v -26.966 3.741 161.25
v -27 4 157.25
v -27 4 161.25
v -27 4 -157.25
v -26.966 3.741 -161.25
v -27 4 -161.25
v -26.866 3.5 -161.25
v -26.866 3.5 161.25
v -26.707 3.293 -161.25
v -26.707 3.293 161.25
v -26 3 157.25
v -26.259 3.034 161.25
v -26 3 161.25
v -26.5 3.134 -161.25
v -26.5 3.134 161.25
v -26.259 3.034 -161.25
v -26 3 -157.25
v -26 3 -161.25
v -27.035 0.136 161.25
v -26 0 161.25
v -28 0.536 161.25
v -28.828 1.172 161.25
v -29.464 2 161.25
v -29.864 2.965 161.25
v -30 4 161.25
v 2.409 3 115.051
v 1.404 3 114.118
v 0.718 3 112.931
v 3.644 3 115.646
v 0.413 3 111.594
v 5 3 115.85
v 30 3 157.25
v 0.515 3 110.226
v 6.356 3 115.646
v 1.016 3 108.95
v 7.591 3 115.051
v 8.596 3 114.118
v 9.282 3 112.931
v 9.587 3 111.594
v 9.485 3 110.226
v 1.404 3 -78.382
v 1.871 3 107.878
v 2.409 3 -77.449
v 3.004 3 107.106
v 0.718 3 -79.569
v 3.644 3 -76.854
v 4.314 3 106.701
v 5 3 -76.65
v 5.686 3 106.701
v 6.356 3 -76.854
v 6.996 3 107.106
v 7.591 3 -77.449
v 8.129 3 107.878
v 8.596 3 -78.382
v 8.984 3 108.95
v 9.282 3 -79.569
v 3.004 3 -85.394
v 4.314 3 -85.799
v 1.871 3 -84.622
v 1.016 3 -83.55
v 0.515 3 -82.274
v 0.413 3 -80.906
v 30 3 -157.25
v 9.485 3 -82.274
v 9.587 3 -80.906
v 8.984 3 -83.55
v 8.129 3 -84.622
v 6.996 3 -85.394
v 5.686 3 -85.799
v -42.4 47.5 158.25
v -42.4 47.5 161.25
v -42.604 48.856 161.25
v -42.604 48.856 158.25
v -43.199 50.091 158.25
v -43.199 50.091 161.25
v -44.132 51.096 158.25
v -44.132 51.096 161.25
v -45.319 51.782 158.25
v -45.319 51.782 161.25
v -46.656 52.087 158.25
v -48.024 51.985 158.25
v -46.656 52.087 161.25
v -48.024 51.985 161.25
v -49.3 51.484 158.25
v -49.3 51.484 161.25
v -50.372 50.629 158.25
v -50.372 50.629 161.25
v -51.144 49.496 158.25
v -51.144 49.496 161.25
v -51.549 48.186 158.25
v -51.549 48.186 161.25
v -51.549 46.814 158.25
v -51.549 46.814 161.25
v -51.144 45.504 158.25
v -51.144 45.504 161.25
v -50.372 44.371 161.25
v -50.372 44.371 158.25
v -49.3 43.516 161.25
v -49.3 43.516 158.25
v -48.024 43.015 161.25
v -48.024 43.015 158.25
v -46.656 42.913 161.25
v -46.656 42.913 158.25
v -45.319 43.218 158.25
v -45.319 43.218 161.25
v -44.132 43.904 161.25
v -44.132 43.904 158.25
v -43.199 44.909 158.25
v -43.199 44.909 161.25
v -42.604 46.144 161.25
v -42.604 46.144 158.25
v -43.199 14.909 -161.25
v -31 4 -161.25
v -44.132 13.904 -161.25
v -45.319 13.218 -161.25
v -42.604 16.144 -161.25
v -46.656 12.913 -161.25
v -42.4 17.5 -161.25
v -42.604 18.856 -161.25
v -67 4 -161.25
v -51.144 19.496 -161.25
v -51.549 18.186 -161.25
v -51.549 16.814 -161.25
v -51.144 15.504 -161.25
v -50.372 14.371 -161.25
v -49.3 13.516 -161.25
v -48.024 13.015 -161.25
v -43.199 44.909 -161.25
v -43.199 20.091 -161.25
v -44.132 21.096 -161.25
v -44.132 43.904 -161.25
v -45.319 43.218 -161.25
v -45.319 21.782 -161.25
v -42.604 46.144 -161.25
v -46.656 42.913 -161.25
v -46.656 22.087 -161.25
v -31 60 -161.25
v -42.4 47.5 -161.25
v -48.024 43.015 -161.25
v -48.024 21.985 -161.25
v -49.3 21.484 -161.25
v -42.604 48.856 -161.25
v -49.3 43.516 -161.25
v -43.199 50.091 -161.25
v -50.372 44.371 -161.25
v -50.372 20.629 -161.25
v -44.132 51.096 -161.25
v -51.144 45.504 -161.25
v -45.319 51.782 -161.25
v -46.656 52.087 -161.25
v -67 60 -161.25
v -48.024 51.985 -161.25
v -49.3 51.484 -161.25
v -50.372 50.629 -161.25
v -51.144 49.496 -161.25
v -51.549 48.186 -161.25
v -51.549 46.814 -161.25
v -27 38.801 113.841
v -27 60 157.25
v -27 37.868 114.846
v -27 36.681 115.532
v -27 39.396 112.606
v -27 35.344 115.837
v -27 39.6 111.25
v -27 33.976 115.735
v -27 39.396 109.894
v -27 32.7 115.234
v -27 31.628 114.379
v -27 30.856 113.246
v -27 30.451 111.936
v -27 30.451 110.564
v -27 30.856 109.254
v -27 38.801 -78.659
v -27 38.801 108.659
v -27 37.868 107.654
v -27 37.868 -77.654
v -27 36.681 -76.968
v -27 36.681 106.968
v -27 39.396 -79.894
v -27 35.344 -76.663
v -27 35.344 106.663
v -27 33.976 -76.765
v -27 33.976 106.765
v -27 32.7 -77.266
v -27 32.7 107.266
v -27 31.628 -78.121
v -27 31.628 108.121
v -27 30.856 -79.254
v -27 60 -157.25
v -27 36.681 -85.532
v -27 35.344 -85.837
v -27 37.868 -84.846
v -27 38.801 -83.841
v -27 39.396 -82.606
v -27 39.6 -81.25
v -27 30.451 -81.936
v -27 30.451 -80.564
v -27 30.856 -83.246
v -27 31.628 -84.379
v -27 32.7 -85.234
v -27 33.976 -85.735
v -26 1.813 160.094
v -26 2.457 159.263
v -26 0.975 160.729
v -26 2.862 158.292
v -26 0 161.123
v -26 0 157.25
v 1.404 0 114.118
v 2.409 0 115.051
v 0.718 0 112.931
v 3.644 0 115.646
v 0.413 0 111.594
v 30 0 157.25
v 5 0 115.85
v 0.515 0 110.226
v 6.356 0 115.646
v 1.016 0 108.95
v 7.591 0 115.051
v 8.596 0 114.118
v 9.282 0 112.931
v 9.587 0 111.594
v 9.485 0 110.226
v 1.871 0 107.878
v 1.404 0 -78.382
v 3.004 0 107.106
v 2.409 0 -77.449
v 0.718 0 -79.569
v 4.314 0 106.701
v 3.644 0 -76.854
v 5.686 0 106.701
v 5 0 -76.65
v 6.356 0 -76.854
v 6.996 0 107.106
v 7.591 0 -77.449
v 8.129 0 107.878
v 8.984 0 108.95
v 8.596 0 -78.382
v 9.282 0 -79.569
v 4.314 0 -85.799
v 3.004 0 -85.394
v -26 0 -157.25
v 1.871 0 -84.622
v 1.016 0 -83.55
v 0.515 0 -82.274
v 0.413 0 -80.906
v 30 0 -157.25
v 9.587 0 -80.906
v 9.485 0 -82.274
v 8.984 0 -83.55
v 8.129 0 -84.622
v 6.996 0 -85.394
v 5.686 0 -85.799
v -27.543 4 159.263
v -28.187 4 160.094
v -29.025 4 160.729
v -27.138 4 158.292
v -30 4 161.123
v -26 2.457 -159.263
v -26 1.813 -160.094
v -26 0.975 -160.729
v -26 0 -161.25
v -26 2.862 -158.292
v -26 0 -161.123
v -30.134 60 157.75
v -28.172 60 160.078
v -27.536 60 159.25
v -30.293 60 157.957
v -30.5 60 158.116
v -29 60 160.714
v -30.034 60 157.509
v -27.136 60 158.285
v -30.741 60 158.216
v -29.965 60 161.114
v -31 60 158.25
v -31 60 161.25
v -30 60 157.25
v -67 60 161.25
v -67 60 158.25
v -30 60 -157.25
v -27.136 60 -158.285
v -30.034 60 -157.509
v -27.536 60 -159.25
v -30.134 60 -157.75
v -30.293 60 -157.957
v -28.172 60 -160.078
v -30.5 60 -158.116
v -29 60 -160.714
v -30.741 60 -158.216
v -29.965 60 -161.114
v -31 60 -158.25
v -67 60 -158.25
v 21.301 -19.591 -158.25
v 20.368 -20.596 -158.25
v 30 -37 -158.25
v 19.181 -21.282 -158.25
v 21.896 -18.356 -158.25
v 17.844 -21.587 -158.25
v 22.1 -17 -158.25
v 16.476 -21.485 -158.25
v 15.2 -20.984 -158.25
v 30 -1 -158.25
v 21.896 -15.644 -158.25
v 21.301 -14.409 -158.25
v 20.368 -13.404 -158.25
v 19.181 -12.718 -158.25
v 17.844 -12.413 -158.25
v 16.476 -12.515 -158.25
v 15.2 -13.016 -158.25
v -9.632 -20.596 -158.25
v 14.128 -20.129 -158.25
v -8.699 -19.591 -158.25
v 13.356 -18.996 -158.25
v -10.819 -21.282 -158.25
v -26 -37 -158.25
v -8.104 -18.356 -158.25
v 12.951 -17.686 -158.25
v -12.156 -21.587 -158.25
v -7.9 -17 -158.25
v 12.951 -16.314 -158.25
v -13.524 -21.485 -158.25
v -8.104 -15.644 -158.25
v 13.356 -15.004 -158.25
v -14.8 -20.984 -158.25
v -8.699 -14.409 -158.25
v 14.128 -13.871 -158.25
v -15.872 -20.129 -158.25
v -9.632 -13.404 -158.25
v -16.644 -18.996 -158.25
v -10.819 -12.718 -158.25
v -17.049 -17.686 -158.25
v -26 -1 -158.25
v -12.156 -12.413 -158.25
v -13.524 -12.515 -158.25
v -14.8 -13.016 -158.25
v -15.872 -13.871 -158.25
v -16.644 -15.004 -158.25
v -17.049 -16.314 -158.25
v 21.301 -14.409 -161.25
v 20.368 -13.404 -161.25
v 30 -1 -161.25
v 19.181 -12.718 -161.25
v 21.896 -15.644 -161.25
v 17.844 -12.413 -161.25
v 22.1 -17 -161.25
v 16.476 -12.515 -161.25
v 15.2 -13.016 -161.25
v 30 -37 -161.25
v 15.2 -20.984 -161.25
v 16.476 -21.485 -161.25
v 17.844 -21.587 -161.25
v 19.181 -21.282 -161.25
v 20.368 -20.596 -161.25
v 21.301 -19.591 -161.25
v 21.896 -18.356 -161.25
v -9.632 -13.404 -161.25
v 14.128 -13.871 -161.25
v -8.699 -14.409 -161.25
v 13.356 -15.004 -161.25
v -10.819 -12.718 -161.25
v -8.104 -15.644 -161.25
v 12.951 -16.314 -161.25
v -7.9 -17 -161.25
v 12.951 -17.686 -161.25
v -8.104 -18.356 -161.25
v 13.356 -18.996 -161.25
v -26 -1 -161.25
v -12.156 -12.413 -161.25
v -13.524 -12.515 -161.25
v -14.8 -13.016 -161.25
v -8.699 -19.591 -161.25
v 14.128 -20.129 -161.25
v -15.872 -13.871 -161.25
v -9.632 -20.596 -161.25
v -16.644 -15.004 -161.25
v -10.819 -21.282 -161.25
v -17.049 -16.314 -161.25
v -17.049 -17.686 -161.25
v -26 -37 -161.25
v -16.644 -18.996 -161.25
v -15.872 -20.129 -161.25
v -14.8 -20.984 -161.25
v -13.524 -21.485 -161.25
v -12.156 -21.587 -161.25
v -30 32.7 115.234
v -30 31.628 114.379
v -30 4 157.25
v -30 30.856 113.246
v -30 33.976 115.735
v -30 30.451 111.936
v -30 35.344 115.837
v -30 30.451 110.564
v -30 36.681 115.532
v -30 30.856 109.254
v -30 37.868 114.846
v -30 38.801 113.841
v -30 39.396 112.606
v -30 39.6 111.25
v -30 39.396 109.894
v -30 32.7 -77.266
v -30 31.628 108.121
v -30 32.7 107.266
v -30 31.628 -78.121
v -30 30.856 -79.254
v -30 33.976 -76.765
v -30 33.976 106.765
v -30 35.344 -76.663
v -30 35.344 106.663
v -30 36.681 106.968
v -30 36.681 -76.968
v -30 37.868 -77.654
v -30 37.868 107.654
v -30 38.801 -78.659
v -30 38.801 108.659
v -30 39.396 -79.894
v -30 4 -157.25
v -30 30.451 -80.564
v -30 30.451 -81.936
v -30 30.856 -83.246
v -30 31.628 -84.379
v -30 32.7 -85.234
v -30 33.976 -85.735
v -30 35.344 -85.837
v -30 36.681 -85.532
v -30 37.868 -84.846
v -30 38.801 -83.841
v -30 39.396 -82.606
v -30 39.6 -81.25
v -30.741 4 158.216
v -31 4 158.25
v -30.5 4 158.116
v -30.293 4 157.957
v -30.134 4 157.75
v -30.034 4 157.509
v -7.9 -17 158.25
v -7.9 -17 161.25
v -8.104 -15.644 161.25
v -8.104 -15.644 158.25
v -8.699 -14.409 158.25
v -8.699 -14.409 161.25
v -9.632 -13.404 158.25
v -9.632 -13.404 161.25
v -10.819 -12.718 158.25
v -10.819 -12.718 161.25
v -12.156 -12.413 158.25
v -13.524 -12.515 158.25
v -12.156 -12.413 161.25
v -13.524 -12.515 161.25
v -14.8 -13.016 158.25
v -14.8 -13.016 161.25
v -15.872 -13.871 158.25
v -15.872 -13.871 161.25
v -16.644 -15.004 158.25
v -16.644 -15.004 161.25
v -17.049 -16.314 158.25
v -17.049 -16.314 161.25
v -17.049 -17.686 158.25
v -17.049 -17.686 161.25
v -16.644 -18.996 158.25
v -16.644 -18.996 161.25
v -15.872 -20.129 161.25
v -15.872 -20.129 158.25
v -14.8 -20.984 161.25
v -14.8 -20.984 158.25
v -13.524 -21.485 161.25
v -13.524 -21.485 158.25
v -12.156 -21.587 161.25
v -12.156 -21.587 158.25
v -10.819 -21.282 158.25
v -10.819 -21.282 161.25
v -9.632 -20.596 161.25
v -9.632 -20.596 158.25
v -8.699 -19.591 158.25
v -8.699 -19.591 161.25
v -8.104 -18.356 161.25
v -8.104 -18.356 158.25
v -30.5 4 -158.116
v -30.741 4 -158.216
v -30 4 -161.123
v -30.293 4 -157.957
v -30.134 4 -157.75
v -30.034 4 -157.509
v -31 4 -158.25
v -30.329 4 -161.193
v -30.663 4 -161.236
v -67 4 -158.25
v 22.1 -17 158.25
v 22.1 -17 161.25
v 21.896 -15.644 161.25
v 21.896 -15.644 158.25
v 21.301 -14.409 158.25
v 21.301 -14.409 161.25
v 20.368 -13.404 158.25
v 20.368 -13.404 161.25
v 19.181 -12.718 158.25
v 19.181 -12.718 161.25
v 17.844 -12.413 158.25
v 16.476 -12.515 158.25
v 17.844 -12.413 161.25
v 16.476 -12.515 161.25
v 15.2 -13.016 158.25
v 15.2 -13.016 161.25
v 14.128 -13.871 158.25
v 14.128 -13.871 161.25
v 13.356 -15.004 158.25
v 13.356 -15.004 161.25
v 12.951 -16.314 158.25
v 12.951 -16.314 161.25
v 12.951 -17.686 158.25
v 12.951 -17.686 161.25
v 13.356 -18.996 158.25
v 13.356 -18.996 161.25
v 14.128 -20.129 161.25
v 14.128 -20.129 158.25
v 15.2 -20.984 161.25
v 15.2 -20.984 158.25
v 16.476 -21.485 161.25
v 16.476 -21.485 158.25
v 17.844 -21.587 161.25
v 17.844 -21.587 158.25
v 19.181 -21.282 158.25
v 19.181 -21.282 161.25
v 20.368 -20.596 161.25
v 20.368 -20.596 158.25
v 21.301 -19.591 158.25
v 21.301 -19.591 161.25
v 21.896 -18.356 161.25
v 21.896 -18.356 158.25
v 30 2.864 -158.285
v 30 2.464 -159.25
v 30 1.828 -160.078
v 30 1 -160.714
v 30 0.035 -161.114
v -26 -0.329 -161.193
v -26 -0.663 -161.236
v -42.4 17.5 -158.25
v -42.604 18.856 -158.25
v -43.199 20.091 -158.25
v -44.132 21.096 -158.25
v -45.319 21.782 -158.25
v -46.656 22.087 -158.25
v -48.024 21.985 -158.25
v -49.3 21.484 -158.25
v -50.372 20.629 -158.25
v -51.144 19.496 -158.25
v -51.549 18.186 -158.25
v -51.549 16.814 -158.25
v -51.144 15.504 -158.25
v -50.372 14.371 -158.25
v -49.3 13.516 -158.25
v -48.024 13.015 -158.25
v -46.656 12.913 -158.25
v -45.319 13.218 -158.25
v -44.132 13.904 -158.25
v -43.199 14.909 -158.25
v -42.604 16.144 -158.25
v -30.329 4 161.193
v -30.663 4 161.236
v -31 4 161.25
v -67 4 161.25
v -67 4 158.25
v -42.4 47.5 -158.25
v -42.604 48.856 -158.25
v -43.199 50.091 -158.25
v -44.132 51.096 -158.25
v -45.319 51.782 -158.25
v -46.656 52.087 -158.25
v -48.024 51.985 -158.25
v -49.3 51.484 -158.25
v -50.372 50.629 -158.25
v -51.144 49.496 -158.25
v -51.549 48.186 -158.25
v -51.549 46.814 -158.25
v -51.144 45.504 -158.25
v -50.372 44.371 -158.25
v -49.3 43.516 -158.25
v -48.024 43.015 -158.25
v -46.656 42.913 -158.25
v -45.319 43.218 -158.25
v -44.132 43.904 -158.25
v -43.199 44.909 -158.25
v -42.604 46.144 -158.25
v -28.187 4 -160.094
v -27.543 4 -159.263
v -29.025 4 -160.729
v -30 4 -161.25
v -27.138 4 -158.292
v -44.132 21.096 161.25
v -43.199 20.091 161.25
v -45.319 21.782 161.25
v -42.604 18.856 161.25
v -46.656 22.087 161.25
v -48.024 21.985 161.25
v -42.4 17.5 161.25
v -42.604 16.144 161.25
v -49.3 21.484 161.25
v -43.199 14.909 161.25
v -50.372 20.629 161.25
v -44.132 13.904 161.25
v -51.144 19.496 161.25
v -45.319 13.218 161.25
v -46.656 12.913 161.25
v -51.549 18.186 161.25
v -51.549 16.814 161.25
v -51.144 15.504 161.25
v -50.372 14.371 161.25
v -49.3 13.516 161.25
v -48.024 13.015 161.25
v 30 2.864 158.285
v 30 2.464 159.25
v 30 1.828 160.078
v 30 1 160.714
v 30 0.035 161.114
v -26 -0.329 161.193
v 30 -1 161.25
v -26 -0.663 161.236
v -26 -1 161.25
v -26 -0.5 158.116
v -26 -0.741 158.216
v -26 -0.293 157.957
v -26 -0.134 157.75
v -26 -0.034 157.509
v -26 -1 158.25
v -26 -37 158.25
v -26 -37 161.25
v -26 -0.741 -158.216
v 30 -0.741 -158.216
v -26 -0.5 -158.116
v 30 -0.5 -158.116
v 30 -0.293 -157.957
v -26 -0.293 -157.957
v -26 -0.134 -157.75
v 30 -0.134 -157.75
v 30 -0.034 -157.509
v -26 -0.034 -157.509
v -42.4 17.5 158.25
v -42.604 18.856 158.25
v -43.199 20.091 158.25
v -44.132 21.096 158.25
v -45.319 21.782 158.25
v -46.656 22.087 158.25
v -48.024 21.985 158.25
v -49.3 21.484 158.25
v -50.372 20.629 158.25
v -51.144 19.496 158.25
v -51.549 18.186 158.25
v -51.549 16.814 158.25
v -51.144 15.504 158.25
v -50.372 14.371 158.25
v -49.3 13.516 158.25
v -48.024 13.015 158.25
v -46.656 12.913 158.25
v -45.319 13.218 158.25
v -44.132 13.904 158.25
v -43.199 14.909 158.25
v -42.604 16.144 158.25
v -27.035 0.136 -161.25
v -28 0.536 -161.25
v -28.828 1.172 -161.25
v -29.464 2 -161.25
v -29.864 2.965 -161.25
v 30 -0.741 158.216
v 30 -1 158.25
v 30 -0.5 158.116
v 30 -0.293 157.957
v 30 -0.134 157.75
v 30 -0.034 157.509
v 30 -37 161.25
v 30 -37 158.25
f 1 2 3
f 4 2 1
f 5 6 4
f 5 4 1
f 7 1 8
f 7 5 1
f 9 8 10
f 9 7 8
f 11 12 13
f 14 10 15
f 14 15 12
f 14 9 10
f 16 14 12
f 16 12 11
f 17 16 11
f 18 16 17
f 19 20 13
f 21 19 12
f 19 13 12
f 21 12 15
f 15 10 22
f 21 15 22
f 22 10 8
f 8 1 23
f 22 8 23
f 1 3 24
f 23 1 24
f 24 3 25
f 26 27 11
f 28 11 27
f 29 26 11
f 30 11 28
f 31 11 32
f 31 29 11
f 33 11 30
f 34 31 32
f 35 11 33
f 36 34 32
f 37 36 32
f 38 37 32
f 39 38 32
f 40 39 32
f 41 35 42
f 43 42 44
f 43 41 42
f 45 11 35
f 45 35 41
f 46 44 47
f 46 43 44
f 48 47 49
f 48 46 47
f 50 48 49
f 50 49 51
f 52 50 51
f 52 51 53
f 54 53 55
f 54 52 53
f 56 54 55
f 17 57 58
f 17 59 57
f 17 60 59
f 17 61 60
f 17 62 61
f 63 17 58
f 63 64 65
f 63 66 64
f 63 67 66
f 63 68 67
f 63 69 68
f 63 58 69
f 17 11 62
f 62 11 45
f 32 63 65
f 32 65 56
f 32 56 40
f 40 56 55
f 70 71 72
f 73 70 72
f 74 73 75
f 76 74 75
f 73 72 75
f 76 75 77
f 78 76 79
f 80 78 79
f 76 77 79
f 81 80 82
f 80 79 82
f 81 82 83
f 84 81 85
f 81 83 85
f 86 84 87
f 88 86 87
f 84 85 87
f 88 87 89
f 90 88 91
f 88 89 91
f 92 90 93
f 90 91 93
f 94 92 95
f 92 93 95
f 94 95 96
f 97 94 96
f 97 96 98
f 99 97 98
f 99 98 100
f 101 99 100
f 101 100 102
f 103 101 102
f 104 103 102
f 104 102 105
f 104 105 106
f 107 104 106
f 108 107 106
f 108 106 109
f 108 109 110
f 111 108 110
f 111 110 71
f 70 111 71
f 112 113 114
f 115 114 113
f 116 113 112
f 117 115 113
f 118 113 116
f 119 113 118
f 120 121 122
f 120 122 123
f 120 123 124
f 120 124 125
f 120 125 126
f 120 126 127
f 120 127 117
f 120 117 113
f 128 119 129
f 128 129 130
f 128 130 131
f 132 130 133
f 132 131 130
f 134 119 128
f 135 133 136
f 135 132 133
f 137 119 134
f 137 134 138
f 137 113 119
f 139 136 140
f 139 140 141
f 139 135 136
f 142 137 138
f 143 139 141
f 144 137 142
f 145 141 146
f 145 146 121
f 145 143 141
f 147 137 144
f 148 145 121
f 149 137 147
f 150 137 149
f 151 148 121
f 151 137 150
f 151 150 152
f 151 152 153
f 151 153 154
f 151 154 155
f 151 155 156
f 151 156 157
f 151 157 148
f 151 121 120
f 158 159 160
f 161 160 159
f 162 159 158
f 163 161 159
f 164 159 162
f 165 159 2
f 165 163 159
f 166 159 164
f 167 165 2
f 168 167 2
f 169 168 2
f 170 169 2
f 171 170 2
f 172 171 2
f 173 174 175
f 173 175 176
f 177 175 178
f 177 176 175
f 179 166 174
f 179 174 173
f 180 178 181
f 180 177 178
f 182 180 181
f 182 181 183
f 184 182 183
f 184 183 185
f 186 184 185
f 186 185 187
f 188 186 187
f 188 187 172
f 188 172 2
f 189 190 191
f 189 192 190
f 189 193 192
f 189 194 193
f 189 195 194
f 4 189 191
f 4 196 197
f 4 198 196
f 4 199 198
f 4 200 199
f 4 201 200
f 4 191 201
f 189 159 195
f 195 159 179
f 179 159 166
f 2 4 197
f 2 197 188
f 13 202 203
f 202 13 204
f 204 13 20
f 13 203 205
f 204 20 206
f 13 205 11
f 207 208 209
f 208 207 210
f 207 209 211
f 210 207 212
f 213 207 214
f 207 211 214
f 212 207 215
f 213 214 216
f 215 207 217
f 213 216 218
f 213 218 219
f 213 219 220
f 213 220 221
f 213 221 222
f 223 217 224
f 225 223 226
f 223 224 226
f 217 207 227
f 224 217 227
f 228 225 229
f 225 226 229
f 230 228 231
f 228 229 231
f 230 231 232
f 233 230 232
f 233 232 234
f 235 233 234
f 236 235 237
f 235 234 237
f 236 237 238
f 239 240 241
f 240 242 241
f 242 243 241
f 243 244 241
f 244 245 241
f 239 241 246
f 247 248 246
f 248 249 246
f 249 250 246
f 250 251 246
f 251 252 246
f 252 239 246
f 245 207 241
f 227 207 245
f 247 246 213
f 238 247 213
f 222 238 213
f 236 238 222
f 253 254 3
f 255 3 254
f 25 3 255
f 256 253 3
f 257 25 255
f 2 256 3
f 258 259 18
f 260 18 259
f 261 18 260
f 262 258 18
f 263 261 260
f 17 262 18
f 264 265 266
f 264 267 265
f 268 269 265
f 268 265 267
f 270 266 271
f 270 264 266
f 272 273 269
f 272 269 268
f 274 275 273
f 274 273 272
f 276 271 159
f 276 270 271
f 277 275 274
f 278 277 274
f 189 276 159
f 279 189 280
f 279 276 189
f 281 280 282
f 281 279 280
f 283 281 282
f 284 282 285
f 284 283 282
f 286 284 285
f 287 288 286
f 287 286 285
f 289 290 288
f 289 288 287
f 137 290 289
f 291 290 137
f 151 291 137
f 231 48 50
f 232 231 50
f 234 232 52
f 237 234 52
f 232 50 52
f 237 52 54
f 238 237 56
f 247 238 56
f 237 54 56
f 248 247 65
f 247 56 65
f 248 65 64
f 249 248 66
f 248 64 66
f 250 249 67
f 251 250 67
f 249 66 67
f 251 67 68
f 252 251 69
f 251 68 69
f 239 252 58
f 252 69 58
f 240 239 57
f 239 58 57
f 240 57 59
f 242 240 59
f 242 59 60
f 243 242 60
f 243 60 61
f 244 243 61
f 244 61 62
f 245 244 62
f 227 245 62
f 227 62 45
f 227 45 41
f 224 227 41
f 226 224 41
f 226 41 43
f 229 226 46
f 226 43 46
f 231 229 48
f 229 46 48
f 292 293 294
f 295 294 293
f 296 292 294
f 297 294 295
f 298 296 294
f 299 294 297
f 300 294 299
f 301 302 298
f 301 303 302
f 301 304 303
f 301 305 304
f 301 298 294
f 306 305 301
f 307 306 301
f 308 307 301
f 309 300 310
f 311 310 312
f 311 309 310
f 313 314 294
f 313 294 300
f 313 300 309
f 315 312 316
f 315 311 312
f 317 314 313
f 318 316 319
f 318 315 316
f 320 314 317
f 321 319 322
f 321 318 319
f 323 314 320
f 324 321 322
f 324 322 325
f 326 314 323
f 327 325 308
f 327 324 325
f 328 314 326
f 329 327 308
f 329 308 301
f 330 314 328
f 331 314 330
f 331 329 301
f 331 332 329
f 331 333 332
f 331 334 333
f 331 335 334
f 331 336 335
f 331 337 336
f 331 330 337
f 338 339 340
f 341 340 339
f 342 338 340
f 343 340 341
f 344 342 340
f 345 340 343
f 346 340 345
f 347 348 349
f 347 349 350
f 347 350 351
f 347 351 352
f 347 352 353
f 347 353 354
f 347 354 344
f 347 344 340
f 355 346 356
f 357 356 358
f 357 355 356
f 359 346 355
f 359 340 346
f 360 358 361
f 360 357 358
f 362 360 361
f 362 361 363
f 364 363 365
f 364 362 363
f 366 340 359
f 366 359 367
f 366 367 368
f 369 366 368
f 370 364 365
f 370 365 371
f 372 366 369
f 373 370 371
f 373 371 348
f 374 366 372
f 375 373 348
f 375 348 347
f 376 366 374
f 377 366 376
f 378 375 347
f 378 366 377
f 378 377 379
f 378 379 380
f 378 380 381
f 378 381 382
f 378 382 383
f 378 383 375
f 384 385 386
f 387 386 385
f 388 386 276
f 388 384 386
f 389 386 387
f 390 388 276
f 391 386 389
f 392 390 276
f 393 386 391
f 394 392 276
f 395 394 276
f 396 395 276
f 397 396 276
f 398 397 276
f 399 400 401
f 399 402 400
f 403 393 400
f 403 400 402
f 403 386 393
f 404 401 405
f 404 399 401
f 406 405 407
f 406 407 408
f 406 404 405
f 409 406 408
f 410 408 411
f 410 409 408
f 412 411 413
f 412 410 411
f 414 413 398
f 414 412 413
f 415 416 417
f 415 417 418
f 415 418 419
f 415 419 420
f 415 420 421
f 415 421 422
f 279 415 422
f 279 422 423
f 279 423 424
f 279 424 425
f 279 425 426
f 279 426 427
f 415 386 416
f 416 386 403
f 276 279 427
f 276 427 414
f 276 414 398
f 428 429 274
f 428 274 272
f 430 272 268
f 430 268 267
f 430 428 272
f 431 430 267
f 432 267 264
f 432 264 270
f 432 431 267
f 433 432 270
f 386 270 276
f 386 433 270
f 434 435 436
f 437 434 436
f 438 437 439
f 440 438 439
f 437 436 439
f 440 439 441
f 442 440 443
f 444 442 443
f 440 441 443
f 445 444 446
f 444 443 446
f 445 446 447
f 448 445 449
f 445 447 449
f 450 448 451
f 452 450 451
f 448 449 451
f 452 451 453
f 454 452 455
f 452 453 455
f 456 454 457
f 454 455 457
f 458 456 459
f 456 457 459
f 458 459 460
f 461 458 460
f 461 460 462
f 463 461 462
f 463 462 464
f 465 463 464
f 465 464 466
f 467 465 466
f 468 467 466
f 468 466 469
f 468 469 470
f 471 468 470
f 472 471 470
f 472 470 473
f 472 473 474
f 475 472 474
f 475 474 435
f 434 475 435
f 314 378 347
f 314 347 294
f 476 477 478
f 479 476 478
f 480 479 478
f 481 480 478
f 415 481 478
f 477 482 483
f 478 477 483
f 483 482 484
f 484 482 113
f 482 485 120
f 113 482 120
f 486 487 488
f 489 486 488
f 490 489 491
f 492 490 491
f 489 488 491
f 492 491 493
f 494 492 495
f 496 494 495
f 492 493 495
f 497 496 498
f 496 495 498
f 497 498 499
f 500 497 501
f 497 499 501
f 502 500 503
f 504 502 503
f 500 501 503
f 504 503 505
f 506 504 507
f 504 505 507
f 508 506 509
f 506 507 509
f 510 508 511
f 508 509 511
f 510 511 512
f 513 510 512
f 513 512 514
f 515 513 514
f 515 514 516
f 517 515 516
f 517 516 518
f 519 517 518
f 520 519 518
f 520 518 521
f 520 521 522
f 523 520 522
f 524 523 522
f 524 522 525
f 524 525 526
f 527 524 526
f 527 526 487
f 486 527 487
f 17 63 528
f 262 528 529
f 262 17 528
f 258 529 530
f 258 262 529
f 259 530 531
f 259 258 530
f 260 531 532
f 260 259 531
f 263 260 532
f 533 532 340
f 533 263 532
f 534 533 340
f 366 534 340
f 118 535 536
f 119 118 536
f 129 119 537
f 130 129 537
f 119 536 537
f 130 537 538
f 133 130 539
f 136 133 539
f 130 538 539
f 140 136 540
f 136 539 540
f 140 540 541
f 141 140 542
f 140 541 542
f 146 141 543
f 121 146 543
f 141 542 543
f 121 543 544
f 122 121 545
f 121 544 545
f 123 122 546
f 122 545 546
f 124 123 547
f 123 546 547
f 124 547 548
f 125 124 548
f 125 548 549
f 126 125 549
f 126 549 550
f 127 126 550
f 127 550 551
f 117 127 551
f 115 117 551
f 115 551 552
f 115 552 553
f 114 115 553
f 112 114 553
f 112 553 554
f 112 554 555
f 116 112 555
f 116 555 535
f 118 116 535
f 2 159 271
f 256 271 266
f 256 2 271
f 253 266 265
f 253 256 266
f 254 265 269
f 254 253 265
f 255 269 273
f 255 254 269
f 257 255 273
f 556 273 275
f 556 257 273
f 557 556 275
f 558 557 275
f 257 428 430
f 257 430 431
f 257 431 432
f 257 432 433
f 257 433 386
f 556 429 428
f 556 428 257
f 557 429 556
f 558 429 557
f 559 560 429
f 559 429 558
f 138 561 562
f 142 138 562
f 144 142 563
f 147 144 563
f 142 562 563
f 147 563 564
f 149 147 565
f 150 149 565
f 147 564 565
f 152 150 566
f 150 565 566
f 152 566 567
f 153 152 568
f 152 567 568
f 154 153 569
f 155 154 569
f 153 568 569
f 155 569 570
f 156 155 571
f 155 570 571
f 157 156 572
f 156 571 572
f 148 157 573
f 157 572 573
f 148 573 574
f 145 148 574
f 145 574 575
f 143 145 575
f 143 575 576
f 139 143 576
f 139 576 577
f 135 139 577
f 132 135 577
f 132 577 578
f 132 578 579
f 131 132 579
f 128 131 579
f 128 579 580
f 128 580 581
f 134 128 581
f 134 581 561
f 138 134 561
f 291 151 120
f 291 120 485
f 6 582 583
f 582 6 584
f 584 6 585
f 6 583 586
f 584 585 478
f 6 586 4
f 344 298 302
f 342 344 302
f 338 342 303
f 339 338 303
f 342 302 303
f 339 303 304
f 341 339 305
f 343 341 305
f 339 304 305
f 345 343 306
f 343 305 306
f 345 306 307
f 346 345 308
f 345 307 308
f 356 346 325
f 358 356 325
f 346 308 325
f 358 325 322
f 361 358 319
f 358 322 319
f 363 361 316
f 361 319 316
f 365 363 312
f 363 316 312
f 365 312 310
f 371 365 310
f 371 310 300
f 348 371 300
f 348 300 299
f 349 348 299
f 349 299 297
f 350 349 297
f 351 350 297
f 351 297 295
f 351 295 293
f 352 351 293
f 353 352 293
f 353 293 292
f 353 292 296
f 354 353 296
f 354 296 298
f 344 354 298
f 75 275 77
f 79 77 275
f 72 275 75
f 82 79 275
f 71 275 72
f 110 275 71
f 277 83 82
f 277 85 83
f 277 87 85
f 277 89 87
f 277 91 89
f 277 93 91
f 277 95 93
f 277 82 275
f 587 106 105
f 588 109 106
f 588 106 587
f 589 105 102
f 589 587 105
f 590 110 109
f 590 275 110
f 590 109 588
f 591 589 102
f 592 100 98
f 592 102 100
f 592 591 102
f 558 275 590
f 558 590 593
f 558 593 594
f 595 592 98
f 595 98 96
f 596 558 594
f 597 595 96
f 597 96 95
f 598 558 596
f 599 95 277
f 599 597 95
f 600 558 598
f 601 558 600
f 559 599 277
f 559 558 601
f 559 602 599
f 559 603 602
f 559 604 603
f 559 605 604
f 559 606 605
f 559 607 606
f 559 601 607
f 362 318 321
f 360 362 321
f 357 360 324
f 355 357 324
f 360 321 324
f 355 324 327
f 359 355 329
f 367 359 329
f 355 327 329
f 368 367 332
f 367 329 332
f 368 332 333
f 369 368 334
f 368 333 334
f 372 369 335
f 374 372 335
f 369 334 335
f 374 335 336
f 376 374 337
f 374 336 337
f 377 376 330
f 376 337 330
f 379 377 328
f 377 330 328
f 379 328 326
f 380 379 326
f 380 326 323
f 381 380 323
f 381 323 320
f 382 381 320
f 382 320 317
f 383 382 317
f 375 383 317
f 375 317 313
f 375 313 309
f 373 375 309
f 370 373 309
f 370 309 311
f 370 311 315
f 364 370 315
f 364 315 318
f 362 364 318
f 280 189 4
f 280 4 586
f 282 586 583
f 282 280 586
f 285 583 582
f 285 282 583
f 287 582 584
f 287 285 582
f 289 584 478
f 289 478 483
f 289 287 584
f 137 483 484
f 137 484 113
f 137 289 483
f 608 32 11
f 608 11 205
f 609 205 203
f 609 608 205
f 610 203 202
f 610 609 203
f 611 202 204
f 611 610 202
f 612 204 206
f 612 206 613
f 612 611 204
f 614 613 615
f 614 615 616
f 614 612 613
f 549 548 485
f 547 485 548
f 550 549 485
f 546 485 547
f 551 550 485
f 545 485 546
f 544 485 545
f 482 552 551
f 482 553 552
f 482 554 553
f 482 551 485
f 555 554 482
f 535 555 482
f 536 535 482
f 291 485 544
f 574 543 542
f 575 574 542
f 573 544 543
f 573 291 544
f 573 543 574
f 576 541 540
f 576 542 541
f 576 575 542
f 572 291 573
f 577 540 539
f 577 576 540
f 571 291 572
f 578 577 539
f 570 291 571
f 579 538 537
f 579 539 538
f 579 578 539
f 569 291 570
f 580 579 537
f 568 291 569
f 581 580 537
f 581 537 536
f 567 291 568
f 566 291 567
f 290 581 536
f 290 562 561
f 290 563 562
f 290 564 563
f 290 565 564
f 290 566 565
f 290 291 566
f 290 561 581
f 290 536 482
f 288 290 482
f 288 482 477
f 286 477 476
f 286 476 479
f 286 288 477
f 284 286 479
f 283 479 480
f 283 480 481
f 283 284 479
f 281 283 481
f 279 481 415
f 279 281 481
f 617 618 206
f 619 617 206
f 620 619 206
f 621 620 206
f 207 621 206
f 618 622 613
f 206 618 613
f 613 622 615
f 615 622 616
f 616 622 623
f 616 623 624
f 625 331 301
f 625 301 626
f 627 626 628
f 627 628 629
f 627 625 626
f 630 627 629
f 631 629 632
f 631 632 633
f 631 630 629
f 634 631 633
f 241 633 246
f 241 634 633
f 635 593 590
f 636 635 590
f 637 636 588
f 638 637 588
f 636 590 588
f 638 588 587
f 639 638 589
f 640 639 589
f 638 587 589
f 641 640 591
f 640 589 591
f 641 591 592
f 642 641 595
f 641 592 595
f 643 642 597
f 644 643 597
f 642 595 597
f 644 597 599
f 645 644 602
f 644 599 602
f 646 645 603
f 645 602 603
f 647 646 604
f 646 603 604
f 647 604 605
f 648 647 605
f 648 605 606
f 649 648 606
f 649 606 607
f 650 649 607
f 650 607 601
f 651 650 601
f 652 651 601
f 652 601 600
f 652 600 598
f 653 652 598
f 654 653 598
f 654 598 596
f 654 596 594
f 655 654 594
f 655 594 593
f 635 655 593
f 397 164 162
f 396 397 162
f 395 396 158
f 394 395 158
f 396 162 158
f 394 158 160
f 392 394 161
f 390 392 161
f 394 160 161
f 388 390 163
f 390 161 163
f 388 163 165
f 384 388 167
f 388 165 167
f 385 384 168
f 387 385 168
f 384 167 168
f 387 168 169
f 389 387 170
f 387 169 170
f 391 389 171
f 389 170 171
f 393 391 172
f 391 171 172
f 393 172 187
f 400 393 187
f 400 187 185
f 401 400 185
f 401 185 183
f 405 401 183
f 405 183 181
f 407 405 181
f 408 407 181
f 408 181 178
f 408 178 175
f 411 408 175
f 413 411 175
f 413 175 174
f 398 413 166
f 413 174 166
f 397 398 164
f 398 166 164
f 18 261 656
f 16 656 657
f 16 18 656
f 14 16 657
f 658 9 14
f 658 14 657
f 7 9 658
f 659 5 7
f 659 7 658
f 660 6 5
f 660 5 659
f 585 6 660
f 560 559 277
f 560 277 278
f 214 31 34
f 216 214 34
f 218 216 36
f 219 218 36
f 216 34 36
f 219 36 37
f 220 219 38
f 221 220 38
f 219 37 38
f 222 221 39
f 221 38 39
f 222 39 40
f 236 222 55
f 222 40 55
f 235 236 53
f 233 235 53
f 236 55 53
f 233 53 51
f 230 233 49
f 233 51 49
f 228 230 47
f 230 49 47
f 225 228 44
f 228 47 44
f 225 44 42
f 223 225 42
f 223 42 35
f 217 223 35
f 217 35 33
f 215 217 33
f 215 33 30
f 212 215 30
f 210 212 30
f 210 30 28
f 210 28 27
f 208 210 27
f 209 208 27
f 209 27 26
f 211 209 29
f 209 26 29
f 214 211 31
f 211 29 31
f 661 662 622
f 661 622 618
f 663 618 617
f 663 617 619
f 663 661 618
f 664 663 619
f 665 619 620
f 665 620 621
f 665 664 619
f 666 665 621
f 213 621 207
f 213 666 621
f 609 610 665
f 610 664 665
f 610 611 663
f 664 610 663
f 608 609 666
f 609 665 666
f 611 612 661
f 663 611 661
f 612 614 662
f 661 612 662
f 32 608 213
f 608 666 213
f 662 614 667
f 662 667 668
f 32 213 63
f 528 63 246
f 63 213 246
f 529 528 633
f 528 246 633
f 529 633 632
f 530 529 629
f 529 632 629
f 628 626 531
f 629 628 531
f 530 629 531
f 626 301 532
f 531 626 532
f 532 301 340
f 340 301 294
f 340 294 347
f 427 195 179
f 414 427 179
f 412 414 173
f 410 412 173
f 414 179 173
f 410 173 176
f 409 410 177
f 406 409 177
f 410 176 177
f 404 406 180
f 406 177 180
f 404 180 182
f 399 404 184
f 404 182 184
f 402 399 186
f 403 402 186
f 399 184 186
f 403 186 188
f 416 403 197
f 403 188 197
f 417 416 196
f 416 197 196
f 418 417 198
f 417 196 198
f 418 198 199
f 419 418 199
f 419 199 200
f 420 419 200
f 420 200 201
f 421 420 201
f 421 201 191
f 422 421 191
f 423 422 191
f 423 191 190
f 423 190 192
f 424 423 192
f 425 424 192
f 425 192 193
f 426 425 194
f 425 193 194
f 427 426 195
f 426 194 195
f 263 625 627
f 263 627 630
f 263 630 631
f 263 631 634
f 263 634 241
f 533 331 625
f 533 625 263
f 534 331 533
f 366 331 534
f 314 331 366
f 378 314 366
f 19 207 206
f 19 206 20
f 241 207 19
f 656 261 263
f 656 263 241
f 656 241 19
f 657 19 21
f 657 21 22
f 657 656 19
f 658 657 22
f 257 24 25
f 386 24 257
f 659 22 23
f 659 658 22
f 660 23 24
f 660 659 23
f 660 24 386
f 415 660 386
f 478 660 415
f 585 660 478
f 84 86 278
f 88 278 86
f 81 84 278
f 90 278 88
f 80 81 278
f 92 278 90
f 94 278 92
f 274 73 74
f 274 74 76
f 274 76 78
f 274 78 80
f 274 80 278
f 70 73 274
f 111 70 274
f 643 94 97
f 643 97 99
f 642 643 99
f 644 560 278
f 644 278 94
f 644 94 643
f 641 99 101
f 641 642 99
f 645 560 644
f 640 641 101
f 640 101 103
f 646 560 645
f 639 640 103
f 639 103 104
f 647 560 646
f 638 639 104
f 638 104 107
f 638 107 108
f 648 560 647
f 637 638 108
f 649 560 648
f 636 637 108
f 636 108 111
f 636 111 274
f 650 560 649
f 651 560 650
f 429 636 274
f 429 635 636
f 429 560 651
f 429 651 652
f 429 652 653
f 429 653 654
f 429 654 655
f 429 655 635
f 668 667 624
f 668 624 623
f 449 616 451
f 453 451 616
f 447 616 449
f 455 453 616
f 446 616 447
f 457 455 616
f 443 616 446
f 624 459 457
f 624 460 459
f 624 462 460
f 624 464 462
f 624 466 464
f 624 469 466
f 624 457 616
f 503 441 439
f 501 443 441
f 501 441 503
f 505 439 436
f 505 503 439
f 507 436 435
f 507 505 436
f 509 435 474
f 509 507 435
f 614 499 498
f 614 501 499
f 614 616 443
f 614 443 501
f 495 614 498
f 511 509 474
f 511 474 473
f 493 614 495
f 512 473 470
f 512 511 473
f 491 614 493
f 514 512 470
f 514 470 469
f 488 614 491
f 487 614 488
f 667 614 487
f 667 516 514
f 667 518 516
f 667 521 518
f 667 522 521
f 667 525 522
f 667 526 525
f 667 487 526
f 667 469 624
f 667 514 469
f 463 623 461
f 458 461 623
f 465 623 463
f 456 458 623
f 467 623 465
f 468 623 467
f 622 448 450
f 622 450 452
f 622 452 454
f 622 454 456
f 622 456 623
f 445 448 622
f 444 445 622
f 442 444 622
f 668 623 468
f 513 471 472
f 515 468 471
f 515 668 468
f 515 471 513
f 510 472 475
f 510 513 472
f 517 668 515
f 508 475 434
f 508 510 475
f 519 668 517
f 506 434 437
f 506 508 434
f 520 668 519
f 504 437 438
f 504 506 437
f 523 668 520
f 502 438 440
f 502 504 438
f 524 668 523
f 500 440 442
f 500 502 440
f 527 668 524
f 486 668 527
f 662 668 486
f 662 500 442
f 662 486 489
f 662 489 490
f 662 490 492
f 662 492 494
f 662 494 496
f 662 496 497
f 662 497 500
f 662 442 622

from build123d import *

# Parameters (mm, degrees)
SKETCH1_W                      = 60
SKETCH1_H                      = 322.5
BASE_FLANGE1_DEPTH             = 3
EDGE_FLANGE1_STRIP_W           = 14
EDGE_FLANGE1_STRIP_H           = 3
EDGE_FLANGE1_STRIP_CUT_DEPTH   = 322.5
EDGE_FLANGE1_DEPTH             = 322.5
EDGE_FLANGE2_STRIP_W           = 14
EDGE_FLANGE2_STRIP_H           = 3
EDGE_FLANGE2_STRIP_CUT_DEPTH   = 56
EDGE_FLANGE2_STRIP_2_W         = 14
EDGE_FLANGE2_STRIP_2_H         = 3
EDGE_FLANGE2_STRIP_CUT_2_DEPTH = 56
EDGE_FLANGE2_STRIP_3_W         = 14
EDGE_FLANGE2_STRIP_3_H         = 3
EDGE_FLANGE2_STRIP_CUT_3_DEPTH = 56
EDGE_FLANGE2_STRIP_4_W         = 14
EDGE_FLANGE2_STRIP_4_H         = 3
EDGE_FLANGE2_STRIP_CUT_4_DEPTH = 56
EDGE_FLANGE2_DEPTH             = 56
EDGE_FLANGE2_BEND_DEPTH        = 56
EDGE_FLANGE2_BEND_2_DEPTH      = 56
EDGE_FLANGE2_BEND_3_DEPTH      = 56
SKETCH18_R                     = 4.6
EXTRUDE1_DEPTH                 = 335.806287277
SKETCH19_R                     = 4.6
EXTRUDE2_DEPTH                 = 3
SKETCH20_R                     = 4.6
EXTRUDE3_DEPTH                 = 3


# Sheet-metal steps are written as plain solids
with BuildPart() as part:
    # Sketch1 → Base-Flange1 (new body)
    with BuildSketch(Plane(origin=(0, 0, 0), x_dir=(1, 0, 0), z_dir=(0, 1, 0))):
        Rectangle(SKETCH1_W, SKETCH1_H)
    extrude(amount=BASE_FLANGE1_DEPTH)

    # Edge-Flange1 strip (across the edge) → Edge-Flange1 strip cut (cut)
    with BuildSketch(Plane(origin=(-30, 3, -161.25), x_dir=(1, 0, 0), z_dir=(0, 0, 1))):
        with Locations((-3, -1.5)):
            Rectangle(EDGE_FLANGE1_STRIP_W, EDGE_FLANGE1_STRIP_H)
    extrude(amount=EDGE_FLANGE1_STRIP_CUT_DEPTH, mode=Mode.SUBTRACT)

    # Edge-Flange1 section (across the edge) → Edge-Flange1 (add)
    with BuildSketch(Plane(origin=(-30, 3, -161.25), x_dir=(1, 0, 0), z_dir=(0, 0, 1))):
        with BuildLine():
            Line((0, 1), (0, 57))
            Line((0, 57), (3, 57))
            Line((3, 57), (3, 1))
            ThreePointArc((3, 1), (3.292893219, 0.292893219), (4, 0))
            Line((4, 0), (4, -3))
            ThreePointArc((4, -3), (1.171572875, -1.828427125), (0, 1))
        make_face()
    extrude(amount=EDGE_FLANGE1_DEPTH)

    # Edge-Flange2 strip (across the edge) → Edge-Flange2 strip cut (cut)
    with BuildSketch(Plane(origin=(-30, 4, 161.25), x_dir=(0, 0, -1), z_dir=(0, 1, 0))):
        with Locations((-3, -1.5)):
            Rectangle(EDGE_FLANGE2_STRIP_W, EDGE_FLANGE2_STRIP_H)
    extrude(amount=EDGE_FLANGE2_STRIP_CUT_DEPTH, mode=Mode.SUBTRACT)

    # Edge-Flange2 strip 2 (across the edge) → Edge-Flange2 strip cut 2 (cut)
    with BuildSketch(Plane(origin=(30, 0, 161.25), x_dir=(0, 0, -1), z_dir=(-1, 0, 0))):
        with Locations((-3, -1.5)):
            Rectangle(EDGE_FLANGE2_STRIP_2_W, EDGE_FLANGE2_STRIP_2_H)
    extrude(amount=EDGE_FLANGE2_STRIP_CUT_2_DEPTH, mode=Mode.SUBTRACT)

    # Edge-Flange2 strip 3 (across the edge) → Edge-Flange2 strip cut 3 (cut)
    with BuildSketch(Plane(origin=(-30, 60, -161.25), x_dir=(0, 0, 1), z_dir=(0, -1, 0))):
        with Locations((-3, -1.5)):
            Rectangle(EDGE_FLANGE2_STRIP_3_W, EDGE_FLANGE2_STRIP_3_H)
    extrude(amount=EDGE_FLANGE2_STRIP_CUT_3_DEPTH, mode=Mode.SUBTRACT)

    # Edge-Flange2 strip 4 (across the edge) → Edge-Flange2 strip cut 4 (cut)
    with BuildSketch(Plane(origin=(-26, 0, -161.25), x_dir=(0, 0, 1), z_dir=(1, 0, 0))):
        with Locations((-3, -1.5)):
            Rectangle(EDGE_FLANGE2_STRIP_4_W, EDGE_FLANGE2_STRIP_4_H)
    extrude(amount=EDGE_FLANGE2_STRIP_CUT_4_DEPTH, mode=Mode.SUBTRACT)

    # Edge-Flange2 section (across the edge) → Edge-Flange2 (add)
    with BuildSketch(Plane(origin=(-30, 4, 161.25), x_dir=(0, 0, -1), z_dir=(0, 1, 0))):
        with BuildLine():
            Line((0, 1), (0, 37))
            Line((0, 37), (3, 37))
            Line((3, 37), (3, 1))
            ThreePointArc((3, 1), (3.292893219, 0.292893219), (4, 0))
            Line((4, 0), (4, -3))
            ThreePointArc((4, -3), (1.171572875, -1.828427125), (0, 1))
        make_face()
    extrude(amount=EDGE_FLANGE2_DEPTH)

    # Edge-Flange2 section 2 (across the edge) → Edge-Flange2 bend (add)
    with BuildSketch(Plane(origin=(30, 0, 161.25), x_dir=(0, 0, -1), z_dir=(-1, 0, 0))):
        with BuildLine():
            Line((0, 1), (0, 37))
            Line((0, 37), (3, 37))
            Line((3, 37), (3, 1))
            ThreePointArc((3, 1), (3.292893219, 0.292893219), (4, 0))
            Line((4, 0), (4, -3))
            ThreePointArc((4, -3), (1.171572875, -1.828427125), (0, 1))
        make_face()
    extrude(amount=EDGE_FLANGE2_BEND_DEPTH)

    # Edge-Flange2 section 3 (across the edge) → Edge-Flange2 bend 2 (add)
    with BuildSketch(Plane(origin=(-30, 60, -161.25), x_dir=(0, 0, 1), z_dir=(0, -1, 0))):
        with BuildLine():
            Line((0, 1), (0, 37))
            Line((0, 37), (3, 37))
            Line((3, 37), (3, 1))
            ThreePointArc((3, 1), (3.292893219, 0.292893219), (4, 0))
            Line((4, 0), (4, -3))
            ThreePointArc((4, -3), (1.171572875, -1.828427125), (0, 1))
        make_face()
    extrude(amount=EDGE_FLANGE2_BEND_2_DEPTH)

    # Edge-Flange2 section 4 (across the edge) → Edge-Flange2 bend 3 (add)
    with BuildSketch(Plane(origin=(-26, 0, -161.25), x_dir=(0, 0, 1), z_dir=(1, 0, 0))):
        with BuildLine():
            Line((0, 1), (0, 37))
            Line((0, 37), (3, 37))
            Line((3, 37), (3, 1))
            ThreePointArc((3, 1), (3.292893219, 0.292893219), (4, 0))
            Line((4, 0), (4, -3))
            ThreePointArc((4, -3), (1.171572875, -1.828427125), (0, 1))
        make_face()
    extrude(amount=EDGE_FLANGE2_BEND_3_DEPTH)

    # Sketch18 → Extrude1 (cut, through all)
    with BuildSketch(Plane.XY.offset(161.25)):
        with Locations((-47, 47.5)):
            Circle(SKETCH18_R)
        with Locations((-47, 17.5)):
            Circle(SKETCH18_R)
        with Locations((-12.5, -17)):
            Circle(SKETCH18_R)
        with Locations((17.5, -17)):
            Circle(SKETCH18_R)
    extrude(amount=-EXTRUDE1_DEPTH, mode=Mode.SUBTRACT)

    # Sketch19 → Extrude2 (cut)
    with BuildSketch(Plane(origin=(-27, 0, 0), x_dir=(0, 0, -1), z_dir=(1, 0, 0))):
        with Locations(Location((-111.25, 35, 0), (0, 0, 90))):
            Circle(SKETCH19_R)
        with Locations(Location((81.25, 35, 0), (0, 0, 90))):
            Circle(SKETCH19_R)
    extrude(amount=-EXTRUDE2_DEPTH, mode=Mode.SUBTRACT)

    # Sketch20 → Extrude3 (cut)
    with BuildSketch(Plane(origin=(0, 3, 0), x_dir=(1, 0, 0), z_dir=(0, 1, 0))):
        with Locations(Location((5, 81.25, 0), (0, 0, 270))):
            Circle(SKETCH20_R)
        with Locations(Location((5, -111.25, 0), (0, 0, 270))):
            Circle(SKETCH20_R)
    extrude(amount=-EXTRUDE3_DEPTH, mode=Mode.SUBTRACT)


solid = part.part
